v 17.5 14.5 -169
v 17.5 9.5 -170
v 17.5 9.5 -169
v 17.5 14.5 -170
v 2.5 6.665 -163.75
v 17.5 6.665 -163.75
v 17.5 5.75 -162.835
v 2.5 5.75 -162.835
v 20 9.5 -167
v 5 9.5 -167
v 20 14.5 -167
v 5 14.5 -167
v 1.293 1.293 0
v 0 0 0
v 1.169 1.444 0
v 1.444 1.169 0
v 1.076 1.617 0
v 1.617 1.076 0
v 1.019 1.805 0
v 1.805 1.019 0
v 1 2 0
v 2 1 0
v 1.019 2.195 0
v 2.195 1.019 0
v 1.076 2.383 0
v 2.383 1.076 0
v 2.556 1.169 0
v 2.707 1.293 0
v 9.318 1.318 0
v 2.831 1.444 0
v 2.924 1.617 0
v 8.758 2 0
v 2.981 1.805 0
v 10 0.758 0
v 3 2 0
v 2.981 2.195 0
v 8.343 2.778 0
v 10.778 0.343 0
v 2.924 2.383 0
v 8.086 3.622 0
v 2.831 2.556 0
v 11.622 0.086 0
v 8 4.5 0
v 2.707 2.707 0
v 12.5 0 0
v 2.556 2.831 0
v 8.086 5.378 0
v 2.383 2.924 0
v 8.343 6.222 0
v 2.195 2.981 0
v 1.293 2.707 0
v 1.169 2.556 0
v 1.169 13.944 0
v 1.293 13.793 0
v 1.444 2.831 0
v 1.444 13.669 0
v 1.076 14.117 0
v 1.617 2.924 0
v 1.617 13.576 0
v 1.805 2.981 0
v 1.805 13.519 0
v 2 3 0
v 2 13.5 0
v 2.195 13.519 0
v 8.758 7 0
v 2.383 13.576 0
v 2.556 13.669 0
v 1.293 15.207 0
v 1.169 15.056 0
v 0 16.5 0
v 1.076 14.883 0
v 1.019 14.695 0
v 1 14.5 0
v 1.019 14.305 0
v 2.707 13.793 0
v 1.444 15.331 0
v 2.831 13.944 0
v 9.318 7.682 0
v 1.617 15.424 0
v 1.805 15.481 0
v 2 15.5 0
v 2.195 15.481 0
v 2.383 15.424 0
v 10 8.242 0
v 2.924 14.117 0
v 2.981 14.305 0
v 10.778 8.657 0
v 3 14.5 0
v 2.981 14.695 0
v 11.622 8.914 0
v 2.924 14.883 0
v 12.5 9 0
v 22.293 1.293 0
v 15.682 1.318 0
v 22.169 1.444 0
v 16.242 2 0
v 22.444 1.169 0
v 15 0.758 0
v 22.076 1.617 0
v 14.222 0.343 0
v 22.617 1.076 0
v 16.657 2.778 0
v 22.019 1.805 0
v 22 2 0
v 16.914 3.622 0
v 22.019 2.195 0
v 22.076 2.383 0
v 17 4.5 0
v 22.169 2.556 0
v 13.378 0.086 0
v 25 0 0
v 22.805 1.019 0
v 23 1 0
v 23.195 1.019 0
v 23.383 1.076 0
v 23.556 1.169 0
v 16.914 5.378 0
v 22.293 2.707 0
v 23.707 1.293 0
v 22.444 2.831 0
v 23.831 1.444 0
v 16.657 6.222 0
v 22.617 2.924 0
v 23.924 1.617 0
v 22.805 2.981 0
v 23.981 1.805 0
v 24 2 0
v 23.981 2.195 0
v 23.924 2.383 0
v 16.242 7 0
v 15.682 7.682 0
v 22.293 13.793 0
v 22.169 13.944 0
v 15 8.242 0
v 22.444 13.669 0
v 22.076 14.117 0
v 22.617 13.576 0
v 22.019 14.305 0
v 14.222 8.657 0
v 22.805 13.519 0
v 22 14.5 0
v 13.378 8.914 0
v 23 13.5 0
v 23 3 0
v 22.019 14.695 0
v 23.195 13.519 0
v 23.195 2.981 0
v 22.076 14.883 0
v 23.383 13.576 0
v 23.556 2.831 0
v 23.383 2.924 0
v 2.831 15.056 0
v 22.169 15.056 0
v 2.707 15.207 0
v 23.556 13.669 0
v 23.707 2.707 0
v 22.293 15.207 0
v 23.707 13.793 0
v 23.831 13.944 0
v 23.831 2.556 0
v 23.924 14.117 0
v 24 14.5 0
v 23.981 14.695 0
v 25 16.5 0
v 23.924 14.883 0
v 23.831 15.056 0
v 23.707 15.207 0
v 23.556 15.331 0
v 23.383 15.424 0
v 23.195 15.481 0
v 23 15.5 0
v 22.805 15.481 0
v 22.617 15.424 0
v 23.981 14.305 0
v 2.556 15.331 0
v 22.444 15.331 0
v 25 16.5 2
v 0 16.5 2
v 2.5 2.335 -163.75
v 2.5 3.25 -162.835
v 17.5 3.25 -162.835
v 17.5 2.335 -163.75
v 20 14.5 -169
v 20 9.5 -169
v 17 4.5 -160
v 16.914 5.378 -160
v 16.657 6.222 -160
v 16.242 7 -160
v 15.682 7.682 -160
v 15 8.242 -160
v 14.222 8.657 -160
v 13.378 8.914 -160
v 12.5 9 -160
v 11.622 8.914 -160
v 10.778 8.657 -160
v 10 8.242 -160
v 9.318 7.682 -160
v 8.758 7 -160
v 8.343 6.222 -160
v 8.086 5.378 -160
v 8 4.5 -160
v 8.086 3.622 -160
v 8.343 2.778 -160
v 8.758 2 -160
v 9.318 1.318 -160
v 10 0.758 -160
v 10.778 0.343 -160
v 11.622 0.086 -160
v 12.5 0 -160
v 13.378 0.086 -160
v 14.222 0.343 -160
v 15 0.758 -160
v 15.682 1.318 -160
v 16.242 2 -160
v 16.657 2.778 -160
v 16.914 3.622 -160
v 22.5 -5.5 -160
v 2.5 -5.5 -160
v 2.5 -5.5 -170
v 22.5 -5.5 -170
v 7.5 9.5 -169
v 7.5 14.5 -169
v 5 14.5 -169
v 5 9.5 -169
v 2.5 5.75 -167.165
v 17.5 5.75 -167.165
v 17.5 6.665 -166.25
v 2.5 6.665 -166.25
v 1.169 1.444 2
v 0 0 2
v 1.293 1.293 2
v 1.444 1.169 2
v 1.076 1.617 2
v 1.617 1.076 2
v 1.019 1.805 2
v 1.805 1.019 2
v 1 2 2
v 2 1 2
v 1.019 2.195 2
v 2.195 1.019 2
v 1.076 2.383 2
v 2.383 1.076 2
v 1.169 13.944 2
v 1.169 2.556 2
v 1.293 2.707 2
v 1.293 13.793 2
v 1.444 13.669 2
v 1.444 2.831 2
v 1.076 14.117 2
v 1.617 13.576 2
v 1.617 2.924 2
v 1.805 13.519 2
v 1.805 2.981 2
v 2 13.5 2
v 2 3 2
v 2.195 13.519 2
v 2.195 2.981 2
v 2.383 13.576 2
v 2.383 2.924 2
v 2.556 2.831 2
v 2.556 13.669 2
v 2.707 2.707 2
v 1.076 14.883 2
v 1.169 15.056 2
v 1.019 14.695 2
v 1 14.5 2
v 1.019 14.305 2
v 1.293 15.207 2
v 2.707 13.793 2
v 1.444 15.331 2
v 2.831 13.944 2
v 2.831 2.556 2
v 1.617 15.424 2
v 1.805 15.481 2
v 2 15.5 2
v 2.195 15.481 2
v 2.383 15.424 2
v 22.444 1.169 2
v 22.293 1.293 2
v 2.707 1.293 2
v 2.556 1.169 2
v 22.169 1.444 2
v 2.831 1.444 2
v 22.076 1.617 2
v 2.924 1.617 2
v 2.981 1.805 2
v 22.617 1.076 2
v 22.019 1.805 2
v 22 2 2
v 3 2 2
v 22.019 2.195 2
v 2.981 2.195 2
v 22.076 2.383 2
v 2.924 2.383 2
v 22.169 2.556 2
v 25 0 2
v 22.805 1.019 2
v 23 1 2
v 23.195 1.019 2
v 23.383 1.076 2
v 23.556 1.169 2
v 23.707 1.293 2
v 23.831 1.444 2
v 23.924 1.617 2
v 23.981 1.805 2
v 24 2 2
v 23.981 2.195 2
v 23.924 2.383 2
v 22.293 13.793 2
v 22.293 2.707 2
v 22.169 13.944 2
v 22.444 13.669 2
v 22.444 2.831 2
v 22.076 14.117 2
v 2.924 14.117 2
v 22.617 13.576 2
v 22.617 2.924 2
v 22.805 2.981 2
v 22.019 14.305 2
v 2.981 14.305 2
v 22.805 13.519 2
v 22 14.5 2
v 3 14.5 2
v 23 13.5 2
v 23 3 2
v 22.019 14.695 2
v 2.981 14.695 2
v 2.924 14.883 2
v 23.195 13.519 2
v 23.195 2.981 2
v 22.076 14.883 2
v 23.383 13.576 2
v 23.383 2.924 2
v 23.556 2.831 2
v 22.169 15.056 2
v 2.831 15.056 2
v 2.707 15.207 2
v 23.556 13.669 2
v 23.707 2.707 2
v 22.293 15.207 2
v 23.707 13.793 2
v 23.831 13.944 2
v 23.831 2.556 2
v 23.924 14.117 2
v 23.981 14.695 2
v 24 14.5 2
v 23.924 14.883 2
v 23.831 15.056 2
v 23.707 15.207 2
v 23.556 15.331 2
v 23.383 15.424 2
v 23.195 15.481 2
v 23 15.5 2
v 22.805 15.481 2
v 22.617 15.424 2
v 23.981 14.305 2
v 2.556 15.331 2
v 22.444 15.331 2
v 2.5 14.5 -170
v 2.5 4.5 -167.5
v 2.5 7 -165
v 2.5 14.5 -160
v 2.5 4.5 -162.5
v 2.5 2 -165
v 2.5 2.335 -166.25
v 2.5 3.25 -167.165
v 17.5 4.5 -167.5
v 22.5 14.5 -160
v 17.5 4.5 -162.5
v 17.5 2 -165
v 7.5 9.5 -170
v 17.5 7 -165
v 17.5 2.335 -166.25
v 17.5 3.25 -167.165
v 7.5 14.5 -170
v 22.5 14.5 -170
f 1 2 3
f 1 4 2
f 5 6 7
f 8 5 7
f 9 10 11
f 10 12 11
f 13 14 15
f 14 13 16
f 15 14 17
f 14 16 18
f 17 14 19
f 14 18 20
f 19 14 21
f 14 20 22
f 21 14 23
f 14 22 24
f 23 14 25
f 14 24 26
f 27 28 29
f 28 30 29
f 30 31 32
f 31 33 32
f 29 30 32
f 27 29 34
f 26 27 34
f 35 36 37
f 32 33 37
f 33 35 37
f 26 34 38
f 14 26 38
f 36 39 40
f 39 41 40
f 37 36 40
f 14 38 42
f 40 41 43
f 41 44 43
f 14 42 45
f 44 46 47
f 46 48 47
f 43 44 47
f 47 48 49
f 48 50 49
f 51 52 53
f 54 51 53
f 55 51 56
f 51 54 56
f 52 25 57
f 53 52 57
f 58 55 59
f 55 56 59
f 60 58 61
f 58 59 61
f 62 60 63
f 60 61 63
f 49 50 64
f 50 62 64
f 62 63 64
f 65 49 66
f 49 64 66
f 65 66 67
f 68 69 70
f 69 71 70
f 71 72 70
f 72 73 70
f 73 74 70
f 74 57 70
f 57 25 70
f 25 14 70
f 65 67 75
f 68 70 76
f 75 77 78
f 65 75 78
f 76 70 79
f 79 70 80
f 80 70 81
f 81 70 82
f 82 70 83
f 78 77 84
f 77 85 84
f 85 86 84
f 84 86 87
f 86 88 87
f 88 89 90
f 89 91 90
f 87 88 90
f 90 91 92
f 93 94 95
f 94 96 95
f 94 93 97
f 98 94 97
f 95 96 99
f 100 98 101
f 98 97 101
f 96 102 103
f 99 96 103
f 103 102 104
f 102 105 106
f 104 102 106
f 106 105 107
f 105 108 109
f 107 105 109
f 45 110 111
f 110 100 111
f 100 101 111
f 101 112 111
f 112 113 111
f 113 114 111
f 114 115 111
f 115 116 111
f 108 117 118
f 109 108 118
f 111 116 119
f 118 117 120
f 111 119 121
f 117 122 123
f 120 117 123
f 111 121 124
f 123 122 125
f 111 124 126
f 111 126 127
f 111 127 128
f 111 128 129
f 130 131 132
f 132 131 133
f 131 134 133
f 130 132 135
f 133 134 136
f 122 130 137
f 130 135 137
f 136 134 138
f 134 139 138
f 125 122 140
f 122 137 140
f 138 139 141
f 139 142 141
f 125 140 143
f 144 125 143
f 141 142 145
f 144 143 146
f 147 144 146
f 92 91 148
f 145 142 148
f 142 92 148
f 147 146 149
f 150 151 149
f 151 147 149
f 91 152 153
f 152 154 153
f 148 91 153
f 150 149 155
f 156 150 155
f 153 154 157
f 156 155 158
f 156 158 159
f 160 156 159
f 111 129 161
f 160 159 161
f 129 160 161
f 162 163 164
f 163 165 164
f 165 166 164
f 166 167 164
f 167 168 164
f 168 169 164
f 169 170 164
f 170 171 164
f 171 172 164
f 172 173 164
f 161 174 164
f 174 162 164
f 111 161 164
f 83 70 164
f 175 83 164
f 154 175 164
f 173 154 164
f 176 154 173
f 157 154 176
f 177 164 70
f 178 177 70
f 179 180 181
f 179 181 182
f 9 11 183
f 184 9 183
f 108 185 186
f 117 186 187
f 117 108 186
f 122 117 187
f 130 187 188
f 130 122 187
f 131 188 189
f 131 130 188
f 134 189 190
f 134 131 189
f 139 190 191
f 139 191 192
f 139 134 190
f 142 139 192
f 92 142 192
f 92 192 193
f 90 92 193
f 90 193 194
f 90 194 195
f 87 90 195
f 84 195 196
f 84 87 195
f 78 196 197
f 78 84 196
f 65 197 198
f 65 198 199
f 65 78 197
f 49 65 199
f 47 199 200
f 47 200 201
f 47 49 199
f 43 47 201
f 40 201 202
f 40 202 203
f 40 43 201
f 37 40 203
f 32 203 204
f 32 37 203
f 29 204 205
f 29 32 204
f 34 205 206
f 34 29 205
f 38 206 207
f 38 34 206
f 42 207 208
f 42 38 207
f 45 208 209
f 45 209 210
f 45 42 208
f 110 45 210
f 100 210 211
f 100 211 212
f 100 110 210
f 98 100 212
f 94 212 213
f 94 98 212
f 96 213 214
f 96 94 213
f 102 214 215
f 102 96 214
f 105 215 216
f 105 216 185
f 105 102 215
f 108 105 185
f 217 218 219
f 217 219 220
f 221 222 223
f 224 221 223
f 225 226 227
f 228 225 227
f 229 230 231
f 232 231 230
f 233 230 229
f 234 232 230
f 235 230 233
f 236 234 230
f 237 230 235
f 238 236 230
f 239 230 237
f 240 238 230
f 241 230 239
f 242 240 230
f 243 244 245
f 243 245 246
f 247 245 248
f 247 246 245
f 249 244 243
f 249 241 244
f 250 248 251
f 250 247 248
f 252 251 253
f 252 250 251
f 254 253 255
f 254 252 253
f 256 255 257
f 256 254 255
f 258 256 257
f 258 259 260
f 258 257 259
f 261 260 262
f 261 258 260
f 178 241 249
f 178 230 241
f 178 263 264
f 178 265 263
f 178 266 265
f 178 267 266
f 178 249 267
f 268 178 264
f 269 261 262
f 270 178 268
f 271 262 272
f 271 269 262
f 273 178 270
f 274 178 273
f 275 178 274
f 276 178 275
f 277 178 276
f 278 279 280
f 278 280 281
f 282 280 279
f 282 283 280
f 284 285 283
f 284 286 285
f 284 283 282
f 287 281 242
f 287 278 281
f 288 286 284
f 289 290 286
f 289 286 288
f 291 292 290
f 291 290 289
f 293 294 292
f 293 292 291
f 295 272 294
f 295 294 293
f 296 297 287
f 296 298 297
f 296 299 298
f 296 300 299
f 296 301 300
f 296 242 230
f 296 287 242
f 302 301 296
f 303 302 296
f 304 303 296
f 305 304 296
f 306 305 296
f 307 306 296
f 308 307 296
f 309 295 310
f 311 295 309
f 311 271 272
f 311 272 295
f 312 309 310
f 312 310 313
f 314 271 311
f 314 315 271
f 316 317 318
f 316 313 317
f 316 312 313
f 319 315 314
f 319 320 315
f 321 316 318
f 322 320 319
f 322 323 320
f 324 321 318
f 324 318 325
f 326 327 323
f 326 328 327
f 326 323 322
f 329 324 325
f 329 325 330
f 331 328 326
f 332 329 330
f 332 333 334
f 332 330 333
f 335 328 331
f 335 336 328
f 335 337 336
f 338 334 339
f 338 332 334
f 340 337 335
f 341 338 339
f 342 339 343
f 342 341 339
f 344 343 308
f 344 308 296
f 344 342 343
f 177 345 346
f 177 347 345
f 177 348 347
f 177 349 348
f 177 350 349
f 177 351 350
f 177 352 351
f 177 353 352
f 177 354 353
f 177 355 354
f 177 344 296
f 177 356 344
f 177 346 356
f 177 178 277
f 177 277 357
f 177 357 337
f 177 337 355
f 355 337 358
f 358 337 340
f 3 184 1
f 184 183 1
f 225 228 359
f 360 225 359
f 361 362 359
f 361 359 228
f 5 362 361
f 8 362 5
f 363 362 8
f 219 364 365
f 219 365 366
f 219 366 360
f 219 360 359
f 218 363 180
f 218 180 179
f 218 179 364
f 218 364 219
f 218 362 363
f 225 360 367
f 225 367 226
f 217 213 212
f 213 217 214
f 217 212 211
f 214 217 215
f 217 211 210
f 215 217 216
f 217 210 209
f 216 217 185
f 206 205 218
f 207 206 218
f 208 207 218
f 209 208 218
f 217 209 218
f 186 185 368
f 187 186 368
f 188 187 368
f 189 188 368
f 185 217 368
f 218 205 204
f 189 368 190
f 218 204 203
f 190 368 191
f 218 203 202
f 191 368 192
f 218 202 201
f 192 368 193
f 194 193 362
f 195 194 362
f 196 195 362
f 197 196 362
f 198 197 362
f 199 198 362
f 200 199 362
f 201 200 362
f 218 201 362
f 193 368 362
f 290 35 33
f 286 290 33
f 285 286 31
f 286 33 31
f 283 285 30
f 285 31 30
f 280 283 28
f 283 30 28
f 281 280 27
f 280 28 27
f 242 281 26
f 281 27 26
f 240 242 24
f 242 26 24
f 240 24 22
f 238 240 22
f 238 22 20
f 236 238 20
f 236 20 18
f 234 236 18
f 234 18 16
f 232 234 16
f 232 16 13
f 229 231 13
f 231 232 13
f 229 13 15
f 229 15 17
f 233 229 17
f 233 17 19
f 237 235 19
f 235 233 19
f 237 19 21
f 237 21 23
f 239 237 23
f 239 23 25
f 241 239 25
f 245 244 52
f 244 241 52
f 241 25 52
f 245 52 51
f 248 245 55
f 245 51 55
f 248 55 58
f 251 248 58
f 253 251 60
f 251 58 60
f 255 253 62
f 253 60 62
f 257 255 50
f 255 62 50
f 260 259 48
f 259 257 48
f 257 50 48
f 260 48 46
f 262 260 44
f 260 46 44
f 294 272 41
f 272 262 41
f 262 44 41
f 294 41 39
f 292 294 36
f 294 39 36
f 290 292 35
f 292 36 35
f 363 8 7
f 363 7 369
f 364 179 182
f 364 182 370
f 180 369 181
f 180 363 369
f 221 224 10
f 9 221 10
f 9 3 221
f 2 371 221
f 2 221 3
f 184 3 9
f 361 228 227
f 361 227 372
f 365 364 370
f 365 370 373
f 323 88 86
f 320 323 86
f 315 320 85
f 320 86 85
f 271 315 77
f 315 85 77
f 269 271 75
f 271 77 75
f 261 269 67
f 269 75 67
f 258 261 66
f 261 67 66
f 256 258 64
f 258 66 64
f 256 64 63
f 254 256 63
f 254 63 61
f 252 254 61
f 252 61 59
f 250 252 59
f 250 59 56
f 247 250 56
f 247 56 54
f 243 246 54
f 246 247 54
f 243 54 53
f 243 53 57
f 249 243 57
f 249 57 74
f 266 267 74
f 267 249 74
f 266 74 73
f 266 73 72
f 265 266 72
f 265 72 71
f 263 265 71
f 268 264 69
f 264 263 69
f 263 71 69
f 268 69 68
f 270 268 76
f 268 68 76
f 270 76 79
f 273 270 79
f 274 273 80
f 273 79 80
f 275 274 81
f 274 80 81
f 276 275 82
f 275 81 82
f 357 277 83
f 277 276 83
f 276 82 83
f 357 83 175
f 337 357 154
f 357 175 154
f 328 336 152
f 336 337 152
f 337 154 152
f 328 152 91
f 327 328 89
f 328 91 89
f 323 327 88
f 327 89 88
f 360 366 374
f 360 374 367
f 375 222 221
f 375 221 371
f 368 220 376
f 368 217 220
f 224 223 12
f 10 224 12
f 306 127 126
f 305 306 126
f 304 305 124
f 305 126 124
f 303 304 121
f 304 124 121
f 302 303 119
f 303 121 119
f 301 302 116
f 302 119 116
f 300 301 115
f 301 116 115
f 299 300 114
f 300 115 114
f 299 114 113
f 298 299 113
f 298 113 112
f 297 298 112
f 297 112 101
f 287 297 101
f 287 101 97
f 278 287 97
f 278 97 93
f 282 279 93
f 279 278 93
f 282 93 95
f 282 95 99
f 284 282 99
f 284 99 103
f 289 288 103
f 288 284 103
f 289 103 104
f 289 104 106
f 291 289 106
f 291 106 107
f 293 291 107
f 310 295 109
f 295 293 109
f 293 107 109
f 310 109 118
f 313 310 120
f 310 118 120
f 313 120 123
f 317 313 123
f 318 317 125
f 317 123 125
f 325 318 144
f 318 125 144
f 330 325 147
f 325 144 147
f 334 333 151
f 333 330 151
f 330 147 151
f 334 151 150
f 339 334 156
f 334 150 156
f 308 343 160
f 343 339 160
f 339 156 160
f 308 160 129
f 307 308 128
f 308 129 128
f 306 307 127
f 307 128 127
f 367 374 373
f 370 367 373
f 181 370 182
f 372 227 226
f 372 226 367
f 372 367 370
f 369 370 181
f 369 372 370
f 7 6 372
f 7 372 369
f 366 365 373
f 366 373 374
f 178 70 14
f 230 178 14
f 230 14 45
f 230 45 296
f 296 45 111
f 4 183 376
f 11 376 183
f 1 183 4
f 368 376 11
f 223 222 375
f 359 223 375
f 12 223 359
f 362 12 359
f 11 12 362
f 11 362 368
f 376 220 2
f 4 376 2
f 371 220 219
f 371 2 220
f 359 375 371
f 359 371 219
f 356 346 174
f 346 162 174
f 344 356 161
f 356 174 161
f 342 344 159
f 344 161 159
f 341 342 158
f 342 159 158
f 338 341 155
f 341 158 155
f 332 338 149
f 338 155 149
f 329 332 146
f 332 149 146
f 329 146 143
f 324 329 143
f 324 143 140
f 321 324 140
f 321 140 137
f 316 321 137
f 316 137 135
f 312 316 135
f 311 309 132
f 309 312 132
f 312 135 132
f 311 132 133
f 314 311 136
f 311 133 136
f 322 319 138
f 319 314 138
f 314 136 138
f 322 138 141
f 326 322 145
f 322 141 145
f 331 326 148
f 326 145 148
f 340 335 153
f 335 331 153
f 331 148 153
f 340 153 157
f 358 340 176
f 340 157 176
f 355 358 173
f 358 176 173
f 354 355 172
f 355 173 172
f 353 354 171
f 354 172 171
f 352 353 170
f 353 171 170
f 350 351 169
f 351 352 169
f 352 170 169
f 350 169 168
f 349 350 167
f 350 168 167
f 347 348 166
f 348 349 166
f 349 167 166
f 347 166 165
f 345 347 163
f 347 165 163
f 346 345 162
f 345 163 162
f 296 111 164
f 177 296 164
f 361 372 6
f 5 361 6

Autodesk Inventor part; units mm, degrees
ref_plane "YZ Plane" through (0, 0, 0) normal (1, 0, 0) x (0, 1, 0)
ref_plane "XZ Plane" through (0, 0, 0) normal (0, 1, 0) x (-1, 0, 0)
ref_plane "XY Plane" through (0, 0, 0) normal (0, 0, 1) x (1, 0, 0)
sketch "스케치1" plane through (0, 0, 0) normal (0, 0, 1) x (1, 0, 0)
  line L0 (0, 0) -> (25, 0)
  line L1 (25, 0) -> (25, 16.5)
  line L2 (25, 16.5) -> (0, 16.5)
  line L3 (0, 16.5) -> (0, 0)
  circle A0 centre (23, 14.5) radius 1
  circle A1 centre (2, 14.5) radius 1
  circle A2 centre (2, 2) radius 1
  circle A3 centre (23, 2) radius 1
  circle A4 centre (12.5, 4.5) radius 4.5
  dimension "d0" = 25
  dimension "d1" = 16.5
  dimension "d2" = 2
  dimension "d3" = 2
  dimension "d4" = 2
  dimension "d5" = 2
  dimension "d6" = 2
  dimension "d7" = 2
  dimension "d8" = 2
  dimension "d9" = 2
  dimension "d10" = 2
  dimension "d11" = 2
  dimension "d12" = 2
  dimension "d13" = 2
  dimension "d14" = 12.5
  dimension "d15" = 12.5
  dimension "d18" = 9
  dimension "d19" = 12
  dimension "d20" = 16.5
extrude "돌출1" add sketch "스케치1" along normal blind 2 contours A4 | L3 L2 L1 L0
extrude "돌출2" add sketch "스케치1" against normal blind 160 contours A4
sketch "스케치2" plane through (12.5, 4.5, -160) normal (0, 0, -1) x (-1, 0, 0)
  line L0 (0, 0) -> (10, 0)
  line L1 (10, 0) -> (10, -10)
  line L2 (10, -10) -> (0, -10)
  line L3 (0, -10) -> (0, 0)
  line L4 (10, -10) -> (-10, -10)
  line L5 (-10, -10) -> (-10, 10)
  line L6 (-10, 10) -> (10, 10)
  line L7 (10, 10) -> (10, -10)
  point P0 (12.5, -4.5)
  dimension "d23" = 10
  dimension "d24" = 10
  dimension "d25" = 20
  dimension "d26" = 20
extrude "돌출3" add sketch "스케치2" along normal blind 10
sketch "스케치3" plane through (2.5, -5.5, -160) normal (-1, 0, 0) x (0, 0, 1)
  line L0 (-10, 20) -> (-10, 0) projected
  line L1 (0, 20) -> (0, 0) projected
  line L2 (-10, 20) -> (0, 0)
  line L3 (-10, 0) -> (0, 20)
  circle A0 centre (-5, 10) radius 2.5
  line L4 (-5, 12.5) -> (-3.75, 12.1651)
  line L5 (-3.75, 12.1651) -> (-2.8349, 11.25)
  line L6 (-2.8349, 11.25) -> (-2.5, 10)
  line L7 (-2.5, 10) -> (-2.8349, 8.75)
  line L8 (-2.8349, 8.75) -> (-3.75, 7.8349)
  line L9 (-3.75, 7.8349) -> (-5, 7.5)
  line L10 (-5, 7.5) -> (-6.25, 7.8349)
  line L11 (-6.25, 7.8349) -> (-7.1651, 8.75)
  line L12 (-7.1651, 8.75) -> (-7.5, 10)
  line L13 (-7.5, 10) -> (-7.1651, 11.25)
  line L14 (-7.1651, 11.25) -> (-6.25, 12.1651)
  line L15 (-6.25, 12.1651) -> (-5, 12.5)
  point P0 (160, 5.5)
  dimension "d29" = 5
extrude "돌출4" cut sketch "스케치3" against normal blind 15 contours L15 L4 L3 L2 | L2 L3 L10 L11 L12 L13 L14 L15 | L3 L2 L9 L10 | L3 L4 L5 L6 L7 L8 L9 L2
sketch "스케치4" plane through (2.5, 14.5, -160) normal (0, 1, 0) x (1, 0, 0)
  line L0 (17.5, 9) -> (2.5, 9)
  line L1 (2.5, 9) -> (2.5, 7)
  line L2 (2.5, 7) -> (17.5, 7)
  line L3 (17.5, 7) -> (17.5, 9)
  line L4 (0, 10) -> (20, 10) projected
  line L5 (20, 0) -> (20, 10) projected
  line L6 (15, 9) -> (5, 9)
  line L7 (5, 9) -> (5, 10)
  line L8 (5, 10) -> (15, 10)
  line L9 (15, 10) -> (15, 9)
  point P0 (-2.5, -160)
  point P1 (15, 9.5)
  point P2 (15, 10)
  point P3 (5, 9)
  dimension "d32" = 15
  dimension "d33" = 2
  dimension "d34" = 1
  dimension "d35" = 2.5
  dimension "d36" = 10
  dimension "d37" = 1
  dimension "d38" = 2.5
extrude "돌출5" cut sketch "스케치4" against normal blind 5
properties part number "camera arm v1_3D 인쇄"
